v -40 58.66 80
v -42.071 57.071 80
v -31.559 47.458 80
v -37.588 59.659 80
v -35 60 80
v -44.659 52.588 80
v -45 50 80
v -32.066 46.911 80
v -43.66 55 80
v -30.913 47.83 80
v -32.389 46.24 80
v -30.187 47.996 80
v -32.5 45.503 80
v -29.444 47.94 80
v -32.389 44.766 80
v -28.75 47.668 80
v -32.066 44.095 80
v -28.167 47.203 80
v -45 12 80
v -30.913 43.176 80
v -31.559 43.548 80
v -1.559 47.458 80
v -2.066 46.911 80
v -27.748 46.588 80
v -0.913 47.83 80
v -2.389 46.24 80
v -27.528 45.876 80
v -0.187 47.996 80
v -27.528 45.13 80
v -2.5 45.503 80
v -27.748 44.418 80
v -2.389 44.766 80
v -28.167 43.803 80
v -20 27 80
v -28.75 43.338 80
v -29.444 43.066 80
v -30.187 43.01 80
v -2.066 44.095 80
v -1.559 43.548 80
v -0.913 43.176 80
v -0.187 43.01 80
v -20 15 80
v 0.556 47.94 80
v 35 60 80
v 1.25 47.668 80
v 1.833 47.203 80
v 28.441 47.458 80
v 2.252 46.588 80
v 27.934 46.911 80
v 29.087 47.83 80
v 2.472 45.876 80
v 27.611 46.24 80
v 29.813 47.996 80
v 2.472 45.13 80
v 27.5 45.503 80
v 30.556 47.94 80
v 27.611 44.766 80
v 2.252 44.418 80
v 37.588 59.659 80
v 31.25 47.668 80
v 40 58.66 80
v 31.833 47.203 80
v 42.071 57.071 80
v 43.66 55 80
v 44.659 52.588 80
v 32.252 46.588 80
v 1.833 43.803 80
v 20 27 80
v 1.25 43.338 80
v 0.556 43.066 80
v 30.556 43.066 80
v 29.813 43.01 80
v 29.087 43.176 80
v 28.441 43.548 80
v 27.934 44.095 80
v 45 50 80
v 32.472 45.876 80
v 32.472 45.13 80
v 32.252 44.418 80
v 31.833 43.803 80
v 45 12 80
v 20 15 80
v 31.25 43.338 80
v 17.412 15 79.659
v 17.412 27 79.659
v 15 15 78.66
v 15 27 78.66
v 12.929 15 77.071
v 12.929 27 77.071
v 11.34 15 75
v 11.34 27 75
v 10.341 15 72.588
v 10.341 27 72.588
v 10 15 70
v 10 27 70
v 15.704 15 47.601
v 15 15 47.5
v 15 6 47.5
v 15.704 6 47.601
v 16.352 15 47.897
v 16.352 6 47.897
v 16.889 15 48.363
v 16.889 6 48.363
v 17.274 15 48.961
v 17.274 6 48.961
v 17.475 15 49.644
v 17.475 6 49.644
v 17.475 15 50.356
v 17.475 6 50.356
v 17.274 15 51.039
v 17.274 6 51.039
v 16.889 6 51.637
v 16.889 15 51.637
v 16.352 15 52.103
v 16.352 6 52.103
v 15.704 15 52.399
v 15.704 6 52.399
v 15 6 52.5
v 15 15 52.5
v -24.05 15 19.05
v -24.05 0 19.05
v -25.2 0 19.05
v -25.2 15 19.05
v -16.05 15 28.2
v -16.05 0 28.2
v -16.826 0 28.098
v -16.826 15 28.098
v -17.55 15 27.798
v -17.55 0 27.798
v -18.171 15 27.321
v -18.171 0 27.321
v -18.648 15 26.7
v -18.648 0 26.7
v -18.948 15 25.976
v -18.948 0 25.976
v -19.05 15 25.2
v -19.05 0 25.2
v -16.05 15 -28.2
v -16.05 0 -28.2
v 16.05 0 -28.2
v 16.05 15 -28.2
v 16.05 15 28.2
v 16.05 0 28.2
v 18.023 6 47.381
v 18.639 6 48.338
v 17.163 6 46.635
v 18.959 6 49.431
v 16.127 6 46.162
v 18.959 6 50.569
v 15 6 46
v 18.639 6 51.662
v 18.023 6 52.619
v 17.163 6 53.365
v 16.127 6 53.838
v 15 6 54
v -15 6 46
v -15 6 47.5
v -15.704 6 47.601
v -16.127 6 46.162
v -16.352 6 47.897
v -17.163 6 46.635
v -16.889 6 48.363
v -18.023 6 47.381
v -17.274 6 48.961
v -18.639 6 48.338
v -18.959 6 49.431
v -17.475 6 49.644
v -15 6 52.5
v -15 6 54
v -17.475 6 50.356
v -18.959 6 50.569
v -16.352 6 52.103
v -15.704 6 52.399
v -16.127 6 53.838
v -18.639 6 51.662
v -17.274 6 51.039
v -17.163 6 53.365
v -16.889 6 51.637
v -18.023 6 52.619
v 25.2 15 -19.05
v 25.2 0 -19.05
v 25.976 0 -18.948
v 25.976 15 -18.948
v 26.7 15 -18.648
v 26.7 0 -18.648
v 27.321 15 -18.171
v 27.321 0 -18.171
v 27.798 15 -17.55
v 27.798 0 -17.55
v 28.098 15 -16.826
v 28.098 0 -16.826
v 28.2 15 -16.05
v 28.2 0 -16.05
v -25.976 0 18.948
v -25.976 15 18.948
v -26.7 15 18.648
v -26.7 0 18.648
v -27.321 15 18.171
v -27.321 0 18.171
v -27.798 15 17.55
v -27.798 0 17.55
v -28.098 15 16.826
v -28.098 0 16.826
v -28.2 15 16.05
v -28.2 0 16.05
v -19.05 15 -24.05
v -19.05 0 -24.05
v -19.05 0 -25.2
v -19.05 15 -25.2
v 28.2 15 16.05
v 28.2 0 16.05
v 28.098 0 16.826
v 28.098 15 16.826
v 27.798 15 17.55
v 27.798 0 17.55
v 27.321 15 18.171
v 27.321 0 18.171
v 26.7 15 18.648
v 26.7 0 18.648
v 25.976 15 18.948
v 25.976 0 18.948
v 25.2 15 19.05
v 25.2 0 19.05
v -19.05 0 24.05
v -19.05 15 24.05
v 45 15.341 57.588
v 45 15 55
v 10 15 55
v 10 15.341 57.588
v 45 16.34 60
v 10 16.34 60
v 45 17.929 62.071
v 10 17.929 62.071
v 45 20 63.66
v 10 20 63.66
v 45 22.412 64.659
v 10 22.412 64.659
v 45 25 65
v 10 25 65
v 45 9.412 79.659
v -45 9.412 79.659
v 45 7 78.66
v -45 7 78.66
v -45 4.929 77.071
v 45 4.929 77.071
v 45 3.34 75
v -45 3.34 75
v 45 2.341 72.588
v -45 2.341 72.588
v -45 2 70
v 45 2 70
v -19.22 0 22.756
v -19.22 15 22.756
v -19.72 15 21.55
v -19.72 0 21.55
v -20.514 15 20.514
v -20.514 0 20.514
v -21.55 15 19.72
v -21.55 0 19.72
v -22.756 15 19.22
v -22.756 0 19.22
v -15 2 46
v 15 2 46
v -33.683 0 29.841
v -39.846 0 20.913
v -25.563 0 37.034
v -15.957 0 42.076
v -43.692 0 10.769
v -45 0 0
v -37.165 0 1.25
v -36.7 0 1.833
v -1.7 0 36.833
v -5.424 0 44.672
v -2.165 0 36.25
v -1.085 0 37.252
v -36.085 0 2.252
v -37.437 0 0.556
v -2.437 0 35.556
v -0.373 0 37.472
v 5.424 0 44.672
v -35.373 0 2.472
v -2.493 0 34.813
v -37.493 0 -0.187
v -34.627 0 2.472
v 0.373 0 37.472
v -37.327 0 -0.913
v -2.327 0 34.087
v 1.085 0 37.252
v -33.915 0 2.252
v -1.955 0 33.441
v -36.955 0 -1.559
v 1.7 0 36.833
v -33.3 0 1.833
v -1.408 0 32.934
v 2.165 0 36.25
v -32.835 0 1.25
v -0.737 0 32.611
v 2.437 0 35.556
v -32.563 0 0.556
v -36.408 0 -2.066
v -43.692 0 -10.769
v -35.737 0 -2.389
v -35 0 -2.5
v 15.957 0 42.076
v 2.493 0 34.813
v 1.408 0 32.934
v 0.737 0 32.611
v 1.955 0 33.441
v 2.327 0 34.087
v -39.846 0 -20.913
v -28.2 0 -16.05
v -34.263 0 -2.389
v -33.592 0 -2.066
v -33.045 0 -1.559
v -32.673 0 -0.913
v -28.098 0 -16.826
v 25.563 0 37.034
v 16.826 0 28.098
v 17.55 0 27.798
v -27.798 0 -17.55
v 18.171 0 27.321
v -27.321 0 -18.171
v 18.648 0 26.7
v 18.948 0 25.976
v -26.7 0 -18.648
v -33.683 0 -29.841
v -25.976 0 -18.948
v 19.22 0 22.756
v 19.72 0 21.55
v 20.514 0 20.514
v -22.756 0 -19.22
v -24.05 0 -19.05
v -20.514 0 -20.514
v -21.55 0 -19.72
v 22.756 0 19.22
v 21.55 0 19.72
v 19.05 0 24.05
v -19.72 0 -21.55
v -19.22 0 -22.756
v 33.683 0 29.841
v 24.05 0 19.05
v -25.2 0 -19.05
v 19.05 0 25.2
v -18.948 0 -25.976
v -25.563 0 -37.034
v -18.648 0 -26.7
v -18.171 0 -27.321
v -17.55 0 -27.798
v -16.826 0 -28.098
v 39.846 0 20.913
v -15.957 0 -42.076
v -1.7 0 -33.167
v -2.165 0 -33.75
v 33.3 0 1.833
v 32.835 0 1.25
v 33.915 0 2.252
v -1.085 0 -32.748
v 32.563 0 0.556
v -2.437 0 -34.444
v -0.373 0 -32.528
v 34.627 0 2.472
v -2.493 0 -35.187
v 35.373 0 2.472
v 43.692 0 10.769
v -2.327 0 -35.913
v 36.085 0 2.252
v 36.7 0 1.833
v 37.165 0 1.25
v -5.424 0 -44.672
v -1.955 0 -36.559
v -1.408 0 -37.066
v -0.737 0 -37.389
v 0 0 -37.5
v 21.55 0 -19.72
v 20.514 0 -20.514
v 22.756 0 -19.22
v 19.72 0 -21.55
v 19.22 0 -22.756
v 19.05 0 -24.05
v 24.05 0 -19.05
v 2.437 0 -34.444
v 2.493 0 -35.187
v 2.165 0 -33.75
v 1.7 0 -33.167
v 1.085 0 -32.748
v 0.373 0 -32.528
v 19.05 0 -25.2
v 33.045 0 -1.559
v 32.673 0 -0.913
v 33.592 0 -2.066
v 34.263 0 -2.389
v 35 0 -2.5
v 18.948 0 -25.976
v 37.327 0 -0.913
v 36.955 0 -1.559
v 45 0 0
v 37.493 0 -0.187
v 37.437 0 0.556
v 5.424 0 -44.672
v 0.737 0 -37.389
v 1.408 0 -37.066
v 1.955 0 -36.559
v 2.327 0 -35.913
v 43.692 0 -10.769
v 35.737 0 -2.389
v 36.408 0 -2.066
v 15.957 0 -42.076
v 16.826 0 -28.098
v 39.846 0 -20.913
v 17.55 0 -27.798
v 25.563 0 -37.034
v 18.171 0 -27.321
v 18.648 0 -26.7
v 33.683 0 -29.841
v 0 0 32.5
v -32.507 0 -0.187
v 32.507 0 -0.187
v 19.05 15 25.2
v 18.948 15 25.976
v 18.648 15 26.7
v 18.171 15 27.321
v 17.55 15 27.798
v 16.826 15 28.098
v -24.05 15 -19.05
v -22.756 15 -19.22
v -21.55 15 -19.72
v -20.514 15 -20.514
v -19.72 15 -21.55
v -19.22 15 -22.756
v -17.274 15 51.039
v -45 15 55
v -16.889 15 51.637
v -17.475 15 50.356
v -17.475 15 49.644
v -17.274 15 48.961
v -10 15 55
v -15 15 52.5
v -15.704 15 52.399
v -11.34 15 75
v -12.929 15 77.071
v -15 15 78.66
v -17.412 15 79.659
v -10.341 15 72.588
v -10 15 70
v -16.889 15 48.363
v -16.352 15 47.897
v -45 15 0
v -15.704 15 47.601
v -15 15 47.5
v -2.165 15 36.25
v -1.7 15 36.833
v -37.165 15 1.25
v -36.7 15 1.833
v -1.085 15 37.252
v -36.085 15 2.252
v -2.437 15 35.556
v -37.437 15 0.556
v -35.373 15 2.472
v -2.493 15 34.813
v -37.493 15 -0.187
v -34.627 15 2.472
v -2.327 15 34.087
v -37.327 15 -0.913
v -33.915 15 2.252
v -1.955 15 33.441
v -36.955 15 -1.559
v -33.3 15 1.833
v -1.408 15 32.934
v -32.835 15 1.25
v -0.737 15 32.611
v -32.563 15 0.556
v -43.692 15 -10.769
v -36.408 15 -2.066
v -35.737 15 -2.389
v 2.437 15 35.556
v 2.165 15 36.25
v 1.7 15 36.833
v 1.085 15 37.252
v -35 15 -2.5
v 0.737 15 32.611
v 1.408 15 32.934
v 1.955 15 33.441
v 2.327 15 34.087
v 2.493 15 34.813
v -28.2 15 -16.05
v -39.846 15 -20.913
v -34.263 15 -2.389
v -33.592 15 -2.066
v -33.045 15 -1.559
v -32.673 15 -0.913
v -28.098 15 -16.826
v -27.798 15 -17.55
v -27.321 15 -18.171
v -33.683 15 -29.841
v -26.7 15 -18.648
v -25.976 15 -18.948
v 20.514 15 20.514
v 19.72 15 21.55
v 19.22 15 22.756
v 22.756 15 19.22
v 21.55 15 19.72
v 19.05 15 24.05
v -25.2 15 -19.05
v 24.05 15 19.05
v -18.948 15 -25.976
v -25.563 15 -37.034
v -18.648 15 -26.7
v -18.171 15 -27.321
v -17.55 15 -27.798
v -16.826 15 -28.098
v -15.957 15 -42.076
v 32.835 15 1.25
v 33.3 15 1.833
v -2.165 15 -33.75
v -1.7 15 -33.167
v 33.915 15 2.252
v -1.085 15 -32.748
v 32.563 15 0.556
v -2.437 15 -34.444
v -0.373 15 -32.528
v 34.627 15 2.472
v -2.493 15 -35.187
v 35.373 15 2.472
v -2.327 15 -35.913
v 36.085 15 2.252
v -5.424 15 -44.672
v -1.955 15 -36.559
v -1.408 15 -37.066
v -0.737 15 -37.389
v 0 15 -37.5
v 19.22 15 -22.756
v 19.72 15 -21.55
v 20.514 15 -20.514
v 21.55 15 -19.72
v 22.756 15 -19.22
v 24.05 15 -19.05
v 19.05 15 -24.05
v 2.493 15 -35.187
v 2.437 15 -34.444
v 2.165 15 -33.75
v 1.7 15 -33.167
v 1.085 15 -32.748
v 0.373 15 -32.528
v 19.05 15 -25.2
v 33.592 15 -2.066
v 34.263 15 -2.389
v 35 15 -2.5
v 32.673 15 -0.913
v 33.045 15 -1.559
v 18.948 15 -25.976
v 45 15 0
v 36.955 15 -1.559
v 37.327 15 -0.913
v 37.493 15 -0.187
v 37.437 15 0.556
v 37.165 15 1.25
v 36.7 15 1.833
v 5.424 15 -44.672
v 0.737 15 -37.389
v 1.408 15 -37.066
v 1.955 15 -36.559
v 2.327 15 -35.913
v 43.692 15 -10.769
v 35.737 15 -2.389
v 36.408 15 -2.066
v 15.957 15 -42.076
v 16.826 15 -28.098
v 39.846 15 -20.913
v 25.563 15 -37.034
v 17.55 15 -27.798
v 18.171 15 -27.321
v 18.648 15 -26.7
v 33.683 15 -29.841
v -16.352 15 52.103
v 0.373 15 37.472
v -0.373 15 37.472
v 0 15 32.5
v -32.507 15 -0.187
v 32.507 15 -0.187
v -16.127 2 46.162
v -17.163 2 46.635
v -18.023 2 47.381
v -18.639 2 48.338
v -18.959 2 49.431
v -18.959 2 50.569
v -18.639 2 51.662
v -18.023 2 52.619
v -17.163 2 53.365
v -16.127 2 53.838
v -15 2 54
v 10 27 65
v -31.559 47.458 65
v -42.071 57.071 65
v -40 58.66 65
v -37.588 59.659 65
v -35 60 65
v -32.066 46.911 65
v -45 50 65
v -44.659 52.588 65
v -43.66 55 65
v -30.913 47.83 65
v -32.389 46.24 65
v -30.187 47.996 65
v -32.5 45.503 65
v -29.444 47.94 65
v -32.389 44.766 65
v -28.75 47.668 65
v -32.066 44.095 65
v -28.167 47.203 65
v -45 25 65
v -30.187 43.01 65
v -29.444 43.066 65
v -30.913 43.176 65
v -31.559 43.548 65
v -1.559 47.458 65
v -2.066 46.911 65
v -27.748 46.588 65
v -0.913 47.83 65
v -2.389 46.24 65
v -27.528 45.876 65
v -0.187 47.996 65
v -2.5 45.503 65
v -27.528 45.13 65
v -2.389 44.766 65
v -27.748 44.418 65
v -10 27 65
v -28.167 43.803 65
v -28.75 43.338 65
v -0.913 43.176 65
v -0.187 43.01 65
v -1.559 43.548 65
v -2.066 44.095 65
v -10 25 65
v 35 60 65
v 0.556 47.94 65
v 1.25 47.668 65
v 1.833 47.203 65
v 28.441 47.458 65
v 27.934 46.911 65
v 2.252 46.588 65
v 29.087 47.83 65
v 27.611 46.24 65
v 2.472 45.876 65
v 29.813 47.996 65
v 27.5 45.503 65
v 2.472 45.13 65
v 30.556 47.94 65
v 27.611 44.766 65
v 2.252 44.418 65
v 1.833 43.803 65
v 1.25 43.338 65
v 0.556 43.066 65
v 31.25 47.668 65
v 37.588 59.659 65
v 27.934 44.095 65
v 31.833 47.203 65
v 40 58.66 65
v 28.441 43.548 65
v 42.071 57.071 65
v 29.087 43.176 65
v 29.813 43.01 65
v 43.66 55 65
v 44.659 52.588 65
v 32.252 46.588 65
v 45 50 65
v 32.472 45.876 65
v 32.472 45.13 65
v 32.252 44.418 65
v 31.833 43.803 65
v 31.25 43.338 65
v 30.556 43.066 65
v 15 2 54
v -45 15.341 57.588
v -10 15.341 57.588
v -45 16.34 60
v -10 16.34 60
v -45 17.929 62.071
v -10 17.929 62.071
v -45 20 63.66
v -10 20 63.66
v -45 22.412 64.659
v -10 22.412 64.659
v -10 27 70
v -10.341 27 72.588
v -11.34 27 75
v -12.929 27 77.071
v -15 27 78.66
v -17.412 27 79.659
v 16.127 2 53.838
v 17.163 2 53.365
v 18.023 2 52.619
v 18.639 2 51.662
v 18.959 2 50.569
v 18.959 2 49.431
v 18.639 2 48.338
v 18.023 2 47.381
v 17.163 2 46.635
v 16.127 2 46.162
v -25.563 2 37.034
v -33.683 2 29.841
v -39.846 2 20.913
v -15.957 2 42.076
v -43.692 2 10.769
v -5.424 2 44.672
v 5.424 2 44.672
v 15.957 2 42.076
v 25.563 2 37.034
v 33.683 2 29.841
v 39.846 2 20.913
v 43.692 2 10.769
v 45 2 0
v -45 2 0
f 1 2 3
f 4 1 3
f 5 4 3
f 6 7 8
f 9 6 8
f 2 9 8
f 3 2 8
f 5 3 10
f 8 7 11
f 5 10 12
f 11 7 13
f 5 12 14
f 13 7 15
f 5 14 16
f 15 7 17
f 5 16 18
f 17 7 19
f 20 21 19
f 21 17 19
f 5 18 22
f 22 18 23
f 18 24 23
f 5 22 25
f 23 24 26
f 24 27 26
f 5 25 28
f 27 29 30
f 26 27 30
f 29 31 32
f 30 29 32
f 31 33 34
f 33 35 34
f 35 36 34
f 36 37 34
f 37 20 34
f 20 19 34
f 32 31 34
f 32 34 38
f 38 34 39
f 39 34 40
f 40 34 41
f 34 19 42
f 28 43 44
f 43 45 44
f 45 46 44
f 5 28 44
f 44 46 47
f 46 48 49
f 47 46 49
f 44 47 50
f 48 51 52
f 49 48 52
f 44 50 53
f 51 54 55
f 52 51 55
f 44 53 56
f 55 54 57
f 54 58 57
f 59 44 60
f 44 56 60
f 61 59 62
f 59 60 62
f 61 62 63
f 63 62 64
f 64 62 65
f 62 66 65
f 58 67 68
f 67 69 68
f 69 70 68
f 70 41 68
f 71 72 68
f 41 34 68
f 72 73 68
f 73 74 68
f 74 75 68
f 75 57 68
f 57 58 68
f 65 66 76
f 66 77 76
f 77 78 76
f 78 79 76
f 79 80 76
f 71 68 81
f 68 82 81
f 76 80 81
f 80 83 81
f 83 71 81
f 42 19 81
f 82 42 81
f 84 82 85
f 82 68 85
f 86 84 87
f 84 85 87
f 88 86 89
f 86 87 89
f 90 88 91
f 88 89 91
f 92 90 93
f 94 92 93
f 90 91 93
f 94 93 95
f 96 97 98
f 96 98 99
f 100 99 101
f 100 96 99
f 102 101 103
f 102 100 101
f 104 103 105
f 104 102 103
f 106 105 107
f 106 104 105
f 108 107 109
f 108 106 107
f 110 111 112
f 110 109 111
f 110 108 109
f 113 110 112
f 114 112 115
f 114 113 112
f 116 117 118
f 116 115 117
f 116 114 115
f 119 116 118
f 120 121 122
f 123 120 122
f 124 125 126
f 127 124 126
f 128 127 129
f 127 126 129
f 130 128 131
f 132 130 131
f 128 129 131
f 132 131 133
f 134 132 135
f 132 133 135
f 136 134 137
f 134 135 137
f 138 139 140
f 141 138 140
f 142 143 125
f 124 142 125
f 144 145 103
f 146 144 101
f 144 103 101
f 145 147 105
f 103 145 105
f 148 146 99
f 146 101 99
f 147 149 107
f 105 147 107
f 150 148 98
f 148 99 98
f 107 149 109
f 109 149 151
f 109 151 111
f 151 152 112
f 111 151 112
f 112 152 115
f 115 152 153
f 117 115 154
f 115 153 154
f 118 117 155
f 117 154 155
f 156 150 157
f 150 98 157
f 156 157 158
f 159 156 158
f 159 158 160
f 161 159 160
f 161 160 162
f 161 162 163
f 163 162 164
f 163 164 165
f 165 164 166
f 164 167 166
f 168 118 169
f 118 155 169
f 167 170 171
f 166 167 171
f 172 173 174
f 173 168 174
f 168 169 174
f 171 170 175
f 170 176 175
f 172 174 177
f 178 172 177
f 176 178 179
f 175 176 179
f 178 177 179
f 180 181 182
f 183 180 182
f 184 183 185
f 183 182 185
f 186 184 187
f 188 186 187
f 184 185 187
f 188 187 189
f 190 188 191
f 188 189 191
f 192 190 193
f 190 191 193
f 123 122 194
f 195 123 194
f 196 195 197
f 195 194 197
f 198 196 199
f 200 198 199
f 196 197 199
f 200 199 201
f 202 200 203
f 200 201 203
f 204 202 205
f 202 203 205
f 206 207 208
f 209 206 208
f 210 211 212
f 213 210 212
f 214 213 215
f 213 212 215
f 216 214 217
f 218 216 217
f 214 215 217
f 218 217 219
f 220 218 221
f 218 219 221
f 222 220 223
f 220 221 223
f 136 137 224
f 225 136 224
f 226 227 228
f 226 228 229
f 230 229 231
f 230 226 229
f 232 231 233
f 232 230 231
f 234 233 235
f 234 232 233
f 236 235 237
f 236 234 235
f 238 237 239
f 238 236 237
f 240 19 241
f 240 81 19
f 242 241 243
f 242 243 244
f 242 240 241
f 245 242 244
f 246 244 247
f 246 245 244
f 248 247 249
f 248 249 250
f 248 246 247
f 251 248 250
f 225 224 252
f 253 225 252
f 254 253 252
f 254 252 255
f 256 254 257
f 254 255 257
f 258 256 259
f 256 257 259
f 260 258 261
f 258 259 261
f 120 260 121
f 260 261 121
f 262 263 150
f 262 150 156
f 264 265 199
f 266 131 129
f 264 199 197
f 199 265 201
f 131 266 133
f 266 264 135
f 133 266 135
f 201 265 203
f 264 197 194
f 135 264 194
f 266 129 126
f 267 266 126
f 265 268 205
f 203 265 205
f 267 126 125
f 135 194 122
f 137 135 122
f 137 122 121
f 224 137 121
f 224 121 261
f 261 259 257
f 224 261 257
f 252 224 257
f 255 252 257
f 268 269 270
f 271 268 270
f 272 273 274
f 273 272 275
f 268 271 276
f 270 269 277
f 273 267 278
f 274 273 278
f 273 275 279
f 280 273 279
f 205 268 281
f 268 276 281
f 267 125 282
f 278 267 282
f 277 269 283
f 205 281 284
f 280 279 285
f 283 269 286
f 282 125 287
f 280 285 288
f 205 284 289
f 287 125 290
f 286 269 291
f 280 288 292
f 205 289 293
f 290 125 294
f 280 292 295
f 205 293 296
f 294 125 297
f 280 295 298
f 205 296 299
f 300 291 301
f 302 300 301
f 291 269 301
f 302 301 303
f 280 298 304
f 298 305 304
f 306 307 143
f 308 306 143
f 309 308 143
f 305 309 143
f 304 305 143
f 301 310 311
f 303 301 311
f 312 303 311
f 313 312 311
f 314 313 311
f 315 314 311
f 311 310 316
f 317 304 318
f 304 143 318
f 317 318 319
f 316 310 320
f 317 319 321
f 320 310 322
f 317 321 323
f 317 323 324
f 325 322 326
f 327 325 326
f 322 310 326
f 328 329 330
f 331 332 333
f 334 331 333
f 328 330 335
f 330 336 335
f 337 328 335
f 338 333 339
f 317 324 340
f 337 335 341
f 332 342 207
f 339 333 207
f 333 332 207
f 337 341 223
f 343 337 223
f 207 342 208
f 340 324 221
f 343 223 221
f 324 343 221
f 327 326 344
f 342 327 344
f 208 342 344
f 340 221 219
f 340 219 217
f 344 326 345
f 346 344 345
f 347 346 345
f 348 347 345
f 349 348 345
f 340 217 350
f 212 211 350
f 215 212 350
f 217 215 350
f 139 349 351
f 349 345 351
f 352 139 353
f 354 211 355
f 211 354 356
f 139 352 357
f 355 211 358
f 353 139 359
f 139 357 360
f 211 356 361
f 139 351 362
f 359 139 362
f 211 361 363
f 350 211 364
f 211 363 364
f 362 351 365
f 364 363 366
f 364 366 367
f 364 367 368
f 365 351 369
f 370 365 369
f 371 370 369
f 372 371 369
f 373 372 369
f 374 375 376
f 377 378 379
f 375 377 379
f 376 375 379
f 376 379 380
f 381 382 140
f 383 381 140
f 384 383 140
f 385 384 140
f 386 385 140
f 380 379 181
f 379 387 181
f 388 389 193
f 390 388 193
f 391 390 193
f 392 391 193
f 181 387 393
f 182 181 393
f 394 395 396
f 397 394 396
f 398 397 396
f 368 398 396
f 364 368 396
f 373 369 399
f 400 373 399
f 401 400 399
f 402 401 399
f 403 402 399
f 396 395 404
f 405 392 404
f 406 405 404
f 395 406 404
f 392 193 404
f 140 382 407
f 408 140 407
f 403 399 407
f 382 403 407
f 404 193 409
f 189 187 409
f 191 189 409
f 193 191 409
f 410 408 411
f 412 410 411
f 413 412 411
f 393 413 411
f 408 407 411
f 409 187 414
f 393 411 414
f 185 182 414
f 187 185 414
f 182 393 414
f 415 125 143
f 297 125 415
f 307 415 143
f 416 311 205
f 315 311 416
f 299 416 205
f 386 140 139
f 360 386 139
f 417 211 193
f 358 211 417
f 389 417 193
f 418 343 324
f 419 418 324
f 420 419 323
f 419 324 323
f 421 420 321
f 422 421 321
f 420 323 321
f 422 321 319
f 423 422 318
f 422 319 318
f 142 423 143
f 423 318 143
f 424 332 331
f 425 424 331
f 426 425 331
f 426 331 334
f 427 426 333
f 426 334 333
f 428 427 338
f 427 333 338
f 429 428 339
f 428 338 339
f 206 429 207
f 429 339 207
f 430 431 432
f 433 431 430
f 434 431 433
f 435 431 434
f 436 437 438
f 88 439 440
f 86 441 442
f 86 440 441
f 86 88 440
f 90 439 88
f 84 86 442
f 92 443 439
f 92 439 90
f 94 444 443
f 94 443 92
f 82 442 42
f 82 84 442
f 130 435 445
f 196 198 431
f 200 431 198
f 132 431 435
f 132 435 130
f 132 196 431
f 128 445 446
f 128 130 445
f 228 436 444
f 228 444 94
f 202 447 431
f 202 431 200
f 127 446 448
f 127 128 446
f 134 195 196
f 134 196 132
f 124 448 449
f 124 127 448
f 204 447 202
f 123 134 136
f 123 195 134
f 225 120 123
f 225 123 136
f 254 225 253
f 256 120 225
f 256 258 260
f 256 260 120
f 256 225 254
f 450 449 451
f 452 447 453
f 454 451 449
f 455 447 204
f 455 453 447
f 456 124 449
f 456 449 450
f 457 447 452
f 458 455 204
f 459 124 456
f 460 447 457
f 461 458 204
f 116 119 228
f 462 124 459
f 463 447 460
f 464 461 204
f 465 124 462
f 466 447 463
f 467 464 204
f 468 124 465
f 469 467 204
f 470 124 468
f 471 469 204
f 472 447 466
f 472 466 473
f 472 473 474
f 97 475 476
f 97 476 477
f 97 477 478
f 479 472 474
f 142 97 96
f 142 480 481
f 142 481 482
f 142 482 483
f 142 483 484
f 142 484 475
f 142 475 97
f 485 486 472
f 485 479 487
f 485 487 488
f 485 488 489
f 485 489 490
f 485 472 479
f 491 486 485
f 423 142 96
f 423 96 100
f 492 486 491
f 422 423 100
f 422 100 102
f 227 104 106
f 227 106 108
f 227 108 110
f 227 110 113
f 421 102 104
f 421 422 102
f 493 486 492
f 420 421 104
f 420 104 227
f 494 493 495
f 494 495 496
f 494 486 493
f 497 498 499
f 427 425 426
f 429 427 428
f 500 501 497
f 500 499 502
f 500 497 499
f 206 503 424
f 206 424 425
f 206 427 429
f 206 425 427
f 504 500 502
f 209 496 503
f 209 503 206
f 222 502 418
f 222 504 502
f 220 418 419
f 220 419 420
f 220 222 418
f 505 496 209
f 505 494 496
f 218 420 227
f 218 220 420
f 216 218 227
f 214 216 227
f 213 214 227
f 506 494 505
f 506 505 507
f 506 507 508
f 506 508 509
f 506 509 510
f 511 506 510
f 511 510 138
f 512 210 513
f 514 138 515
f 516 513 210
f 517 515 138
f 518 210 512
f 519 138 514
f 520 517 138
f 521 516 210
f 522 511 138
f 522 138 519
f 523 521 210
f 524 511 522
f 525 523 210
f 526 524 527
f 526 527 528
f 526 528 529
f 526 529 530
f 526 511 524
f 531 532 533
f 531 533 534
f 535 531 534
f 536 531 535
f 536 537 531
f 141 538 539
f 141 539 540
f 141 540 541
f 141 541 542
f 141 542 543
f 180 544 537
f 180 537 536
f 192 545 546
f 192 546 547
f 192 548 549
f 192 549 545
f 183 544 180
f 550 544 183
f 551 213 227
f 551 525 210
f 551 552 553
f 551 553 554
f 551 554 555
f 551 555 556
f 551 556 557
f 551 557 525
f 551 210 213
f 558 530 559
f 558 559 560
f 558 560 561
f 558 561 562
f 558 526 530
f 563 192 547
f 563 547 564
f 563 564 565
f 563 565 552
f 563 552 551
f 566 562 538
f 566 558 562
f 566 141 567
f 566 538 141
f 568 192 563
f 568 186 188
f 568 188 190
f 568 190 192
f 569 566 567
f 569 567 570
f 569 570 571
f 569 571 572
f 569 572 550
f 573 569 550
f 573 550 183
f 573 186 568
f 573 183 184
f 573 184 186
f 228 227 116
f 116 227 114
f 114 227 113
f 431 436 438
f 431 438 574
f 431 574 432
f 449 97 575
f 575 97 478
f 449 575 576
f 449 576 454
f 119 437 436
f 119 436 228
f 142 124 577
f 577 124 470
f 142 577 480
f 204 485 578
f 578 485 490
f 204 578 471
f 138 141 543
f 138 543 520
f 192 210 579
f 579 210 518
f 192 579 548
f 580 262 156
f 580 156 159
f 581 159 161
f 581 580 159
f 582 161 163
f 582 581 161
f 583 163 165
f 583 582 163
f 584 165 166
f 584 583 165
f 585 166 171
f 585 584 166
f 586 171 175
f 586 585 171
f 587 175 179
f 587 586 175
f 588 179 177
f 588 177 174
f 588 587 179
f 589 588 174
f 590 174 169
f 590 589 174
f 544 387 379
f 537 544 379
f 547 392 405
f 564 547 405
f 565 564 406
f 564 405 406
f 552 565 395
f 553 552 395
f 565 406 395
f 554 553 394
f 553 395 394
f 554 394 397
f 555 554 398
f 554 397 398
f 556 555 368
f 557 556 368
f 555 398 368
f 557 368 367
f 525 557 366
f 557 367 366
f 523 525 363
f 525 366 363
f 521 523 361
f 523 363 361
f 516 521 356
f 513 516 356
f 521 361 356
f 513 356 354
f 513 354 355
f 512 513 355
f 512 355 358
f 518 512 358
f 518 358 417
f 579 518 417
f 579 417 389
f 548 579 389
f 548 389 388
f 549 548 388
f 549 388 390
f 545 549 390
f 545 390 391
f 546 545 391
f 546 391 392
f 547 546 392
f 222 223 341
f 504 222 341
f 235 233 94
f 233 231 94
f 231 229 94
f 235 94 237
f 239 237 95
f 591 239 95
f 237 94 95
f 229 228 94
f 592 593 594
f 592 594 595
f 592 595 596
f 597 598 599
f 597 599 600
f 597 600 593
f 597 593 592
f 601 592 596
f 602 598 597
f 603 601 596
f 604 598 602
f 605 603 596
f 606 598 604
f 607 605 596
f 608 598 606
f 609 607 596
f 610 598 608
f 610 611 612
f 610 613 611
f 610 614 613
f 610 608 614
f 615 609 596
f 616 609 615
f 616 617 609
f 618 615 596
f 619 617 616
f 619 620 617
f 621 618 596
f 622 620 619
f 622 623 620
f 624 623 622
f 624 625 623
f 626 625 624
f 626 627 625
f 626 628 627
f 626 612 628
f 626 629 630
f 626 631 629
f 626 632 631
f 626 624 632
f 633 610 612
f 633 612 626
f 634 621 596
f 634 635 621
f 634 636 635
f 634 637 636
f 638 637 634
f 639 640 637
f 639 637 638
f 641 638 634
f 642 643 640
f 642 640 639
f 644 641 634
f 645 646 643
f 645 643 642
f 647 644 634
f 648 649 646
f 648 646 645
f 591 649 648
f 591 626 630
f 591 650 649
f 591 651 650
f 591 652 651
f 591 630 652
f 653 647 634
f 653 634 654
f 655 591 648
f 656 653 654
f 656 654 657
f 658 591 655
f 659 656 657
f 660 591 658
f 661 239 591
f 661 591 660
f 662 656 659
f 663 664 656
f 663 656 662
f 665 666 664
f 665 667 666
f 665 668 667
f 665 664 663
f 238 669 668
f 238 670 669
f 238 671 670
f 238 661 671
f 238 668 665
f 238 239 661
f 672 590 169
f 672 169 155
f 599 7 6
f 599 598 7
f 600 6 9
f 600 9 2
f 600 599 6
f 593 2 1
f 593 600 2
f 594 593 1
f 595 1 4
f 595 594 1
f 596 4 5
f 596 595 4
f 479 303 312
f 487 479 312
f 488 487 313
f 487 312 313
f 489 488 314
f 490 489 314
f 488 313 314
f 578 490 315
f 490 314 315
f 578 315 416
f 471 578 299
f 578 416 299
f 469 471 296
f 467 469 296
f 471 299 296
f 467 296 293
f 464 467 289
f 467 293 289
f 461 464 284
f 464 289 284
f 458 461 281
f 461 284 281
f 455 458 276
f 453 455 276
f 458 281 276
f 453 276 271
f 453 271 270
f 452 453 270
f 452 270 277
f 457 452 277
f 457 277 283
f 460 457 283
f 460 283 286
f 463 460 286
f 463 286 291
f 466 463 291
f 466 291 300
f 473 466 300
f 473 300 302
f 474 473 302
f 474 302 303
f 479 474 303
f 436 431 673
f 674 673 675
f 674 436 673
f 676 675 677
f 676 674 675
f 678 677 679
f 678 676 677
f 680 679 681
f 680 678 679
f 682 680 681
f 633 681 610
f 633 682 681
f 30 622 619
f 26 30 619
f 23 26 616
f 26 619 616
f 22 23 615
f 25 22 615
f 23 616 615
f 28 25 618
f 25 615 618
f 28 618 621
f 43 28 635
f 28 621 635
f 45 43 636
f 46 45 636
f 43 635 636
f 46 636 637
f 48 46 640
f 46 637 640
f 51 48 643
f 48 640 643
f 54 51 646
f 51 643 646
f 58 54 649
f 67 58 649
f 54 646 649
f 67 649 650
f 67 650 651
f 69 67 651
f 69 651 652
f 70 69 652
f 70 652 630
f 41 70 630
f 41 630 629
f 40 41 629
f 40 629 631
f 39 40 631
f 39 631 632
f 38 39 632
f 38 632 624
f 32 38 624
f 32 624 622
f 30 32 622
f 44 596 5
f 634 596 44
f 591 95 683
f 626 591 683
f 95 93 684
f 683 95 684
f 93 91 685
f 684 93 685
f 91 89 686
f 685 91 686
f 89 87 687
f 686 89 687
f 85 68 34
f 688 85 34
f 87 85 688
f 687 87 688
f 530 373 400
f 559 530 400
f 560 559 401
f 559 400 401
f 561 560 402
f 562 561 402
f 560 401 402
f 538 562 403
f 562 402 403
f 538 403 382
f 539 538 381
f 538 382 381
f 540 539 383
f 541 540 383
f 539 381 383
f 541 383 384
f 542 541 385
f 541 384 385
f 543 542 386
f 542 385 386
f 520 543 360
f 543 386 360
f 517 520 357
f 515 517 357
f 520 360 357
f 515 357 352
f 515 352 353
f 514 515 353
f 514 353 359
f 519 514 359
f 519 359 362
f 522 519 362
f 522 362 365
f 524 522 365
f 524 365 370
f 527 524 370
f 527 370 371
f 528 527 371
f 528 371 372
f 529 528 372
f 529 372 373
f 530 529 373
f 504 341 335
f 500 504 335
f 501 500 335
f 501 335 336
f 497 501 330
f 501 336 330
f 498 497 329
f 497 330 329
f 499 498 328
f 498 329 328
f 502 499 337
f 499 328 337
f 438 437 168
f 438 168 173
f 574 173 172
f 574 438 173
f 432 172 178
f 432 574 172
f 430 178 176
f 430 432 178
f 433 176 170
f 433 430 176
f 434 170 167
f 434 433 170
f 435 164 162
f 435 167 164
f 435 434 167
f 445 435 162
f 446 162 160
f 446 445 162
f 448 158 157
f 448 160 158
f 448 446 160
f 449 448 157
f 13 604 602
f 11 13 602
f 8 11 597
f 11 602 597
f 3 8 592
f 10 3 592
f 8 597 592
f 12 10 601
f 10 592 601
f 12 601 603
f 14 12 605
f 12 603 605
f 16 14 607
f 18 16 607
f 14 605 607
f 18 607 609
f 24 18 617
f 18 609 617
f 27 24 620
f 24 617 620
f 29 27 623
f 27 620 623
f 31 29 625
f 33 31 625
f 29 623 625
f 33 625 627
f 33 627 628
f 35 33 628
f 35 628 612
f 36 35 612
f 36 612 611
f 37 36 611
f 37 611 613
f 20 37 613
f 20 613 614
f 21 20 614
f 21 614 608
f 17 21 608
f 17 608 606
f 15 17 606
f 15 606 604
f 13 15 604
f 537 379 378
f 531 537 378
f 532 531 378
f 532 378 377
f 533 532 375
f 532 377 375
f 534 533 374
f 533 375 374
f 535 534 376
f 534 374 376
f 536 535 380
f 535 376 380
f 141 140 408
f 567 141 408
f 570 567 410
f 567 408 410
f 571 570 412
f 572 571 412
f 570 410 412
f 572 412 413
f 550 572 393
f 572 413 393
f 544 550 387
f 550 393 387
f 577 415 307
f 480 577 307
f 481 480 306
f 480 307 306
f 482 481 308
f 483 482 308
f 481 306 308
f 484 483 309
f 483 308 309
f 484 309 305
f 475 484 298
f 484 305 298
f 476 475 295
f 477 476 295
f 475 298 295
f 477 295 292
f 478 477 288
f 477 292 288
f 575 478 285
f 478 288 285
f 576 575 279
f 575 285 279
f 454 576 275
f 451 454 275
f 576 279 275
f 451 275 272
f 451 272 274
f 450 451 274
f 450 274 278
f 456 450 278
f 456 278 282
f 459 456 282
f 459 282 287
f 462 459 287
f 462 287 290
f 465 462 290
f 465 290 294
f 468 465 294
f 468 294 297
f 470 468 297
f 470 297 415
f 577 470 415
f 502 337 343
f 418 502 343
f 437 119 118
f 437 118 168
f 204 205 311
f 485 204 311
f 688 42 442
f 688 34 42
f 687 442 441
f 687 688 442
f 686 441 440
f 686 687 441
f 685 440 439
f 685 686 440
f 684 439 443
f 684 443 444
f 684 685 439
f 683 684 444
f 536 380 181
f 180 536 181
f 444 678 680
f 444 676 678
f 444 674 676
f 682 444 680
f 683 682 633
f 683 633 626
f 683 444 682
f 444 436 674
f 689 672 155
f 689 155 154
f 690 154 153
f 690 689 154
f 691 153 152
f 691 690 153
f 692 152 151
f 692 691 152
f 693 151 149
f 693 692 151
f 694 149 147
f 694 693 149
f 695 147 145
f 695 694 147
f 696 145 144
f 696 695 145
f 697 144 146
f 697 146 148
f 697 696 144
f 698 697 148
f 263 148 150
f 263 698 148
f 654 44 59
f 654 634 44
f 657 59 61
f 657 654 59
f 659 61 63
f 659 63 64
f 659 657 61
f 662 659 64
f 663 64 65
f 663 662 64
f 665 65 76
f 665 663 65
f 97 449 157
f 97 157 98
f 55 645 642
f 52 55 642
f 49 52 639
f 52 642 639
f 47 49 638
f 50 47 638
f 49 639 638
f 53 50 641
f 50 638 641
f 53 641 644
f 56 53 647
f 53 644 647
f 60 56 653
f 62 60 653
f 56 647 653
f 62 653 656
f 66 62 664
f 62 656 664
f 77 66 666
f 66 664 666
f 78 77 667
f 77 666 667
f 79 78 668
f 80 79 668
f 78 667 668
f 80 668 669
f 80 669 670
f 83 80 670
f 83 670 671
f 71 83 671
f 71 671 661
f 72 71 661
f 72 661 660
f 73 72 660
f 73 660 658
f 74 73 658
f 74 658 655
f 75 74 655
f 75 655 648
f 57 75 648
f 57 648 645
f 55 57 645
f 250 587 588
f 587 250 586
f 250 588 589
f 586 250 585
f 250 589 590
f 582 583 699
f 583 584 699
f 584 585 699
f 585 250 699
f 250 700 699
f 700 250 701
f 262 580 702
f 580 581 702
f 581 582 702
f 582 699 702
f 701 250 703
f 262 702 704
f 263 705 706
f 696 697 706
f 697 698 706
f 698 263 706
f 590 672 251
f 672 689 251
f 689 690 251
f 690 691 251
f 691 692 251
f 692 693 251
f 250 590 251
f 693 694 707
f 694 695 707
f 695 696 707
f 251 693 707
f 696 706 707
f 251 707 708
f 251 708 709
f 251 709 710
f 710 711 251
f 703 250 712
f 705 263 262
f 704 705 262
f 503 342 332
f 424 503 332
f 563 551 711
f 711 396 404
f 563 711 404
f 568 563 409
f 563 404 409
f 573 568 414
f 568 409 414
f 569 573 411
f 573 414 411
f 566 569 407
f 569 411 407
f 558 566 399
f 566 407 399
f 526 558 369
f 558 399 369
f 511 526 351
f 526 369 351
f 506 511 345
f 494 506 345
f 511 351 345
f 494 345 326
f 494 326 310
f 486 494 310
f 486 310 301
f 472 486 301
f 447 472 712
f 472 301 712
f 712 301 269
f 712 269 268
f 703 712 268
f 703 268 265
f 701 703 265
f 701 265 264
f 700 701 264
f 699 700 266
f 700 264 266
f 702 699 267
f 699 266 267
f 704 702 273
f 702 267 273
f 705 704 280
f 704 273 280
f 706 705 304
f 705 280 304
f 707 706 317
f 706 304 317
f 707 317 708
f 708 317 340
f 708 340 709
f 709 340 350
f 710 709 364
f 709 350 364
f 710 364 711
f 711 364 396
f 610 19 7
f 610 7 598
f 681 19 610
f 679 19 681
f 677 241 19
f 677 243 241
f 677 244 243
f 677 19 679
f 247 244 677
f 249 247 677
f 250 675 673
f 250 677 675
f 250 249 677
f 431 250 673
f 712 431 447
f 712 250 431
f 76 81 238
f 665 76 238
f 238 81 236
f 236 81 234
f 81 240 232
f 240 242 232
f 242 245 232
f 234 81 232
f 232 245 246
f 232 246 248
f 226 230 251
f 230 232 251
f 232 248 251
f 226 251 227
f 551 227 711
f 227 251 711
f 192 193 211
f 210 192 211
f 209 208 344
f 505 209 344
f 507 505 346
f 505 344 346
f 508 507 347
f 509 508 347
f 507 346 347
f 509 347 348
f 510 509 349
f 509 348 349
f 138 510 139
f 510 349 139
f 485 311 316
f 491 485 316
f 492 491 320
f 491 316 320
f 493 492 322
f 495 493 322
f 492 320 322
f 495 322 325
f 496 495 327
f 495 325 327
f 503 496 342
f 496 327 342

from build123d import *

# Parameters (mm, degrees)
BOSS_EXTRUDE1_DEPTH     = 15
SKETCH2_W               = 90
SKETCH2_H               = 15
BOSS_EXTRUDE2_DEPTH     = 45
CUT_EXTRUDE1_DEPTH      = 2
SKETCH4_R               = 2.5
CUT_EXTRUDE2_DEPTH      = 110.658560997
FILLET1_R               = 10
SKETCH5_R               = 2.5
CUT_EXTRUDE3_DEPTH      = 134.135269557
CUT_EXTRUDE4_DEPTH      = 103.225241501
CUT_EXTRUDE5_DEPTH      = 4
CUT_EXTRUDE6_DEPTH      = 10
CUT_EXTRUDE6_DEPTH_BACK = 15
SKETCH8_W               = 20
SKETCH8_H               = 12
FILLET2_R               = 10


with BuildPart() as part:
    # Sketch1 → Boss-Extrude1 (new body)
    with BuildSketch(Plane(origin=(0, 0, 0), x_dir=(1, 0, 0), z_dir=(0, 1, 0))):
        with BuildLine():
            ThreePointArc((45, 0), (0, -45), (-45, 0))
            Line((-45, 0), (-45, -80))
            Line((-45, -80), (45, -80))
            Line((45, -80), (45, 0))
        make_face()
        with BuildLine():
            Line((-28.2, -16.05), (-28.2, 0))
            Line((-28.2, 0), (-45, 0))
            ThreePointArc((-45, 0), (0, -45), (45, 0))
            Line((45, 0), (28.2, 0))
            Line((28.2, 0), (28.2, -16.05))
            ThreePointArc((28.2, -16.05), (27.321320344, -18.171320344), (25.2, -19.05))
            Line((25.2, -19.05), (24.05, -19.05))
            ThreePointArc((24.05, -19.05), (20.514466094, -20.514466094), (19.05, -24.05))
            Line((19.05, -24.05), (19.05, -25.2))
            ThreePointArc((19.05, -25.2), (18.171320344, -27.321320344), (16.05, -28.2))
            Line((16.05, -28.2), (-16.05, -28.2))
            ThreePointArc((-16.05, -28.2), (-18.171320344, -27.321320344), (-19.05, -25.2))
            Line((-19.05, -25.2), (-19.05, -24.05))
            ThreePointArc((-19.05, -24.05), (-20.514466094, -20.514466094), (-24.05, -19.05))
            Line((-24.05, -19.05), (-25.2, -19.05))
            ThreePointArc((-25.2, -19.05), (-27.321320344, -18.171320344), (-28.2, -16.05))
        make_face()
        with BuildLine():
            ThreePointArc((-19.05, 25.2), (-18.171320344, 27.321320344), (-16.05, 28.2))
            Line((-16.05, 28.2), (16.05, 28.2))
            ThreePointArc((16.05, 28.2), (18.171320344, 27.321320344), (19.05, 25.2))
            Line((19.05, 25.2), (19.05, 24.05))
            ThreePointArc((19.05, 24.05), (20.514466094, 20.514466094), (24.05, 19.05))
            Line((24.05, 19.05), (25.2, 19.05))
            ThreePointArc((25.2, 19.05), (27.321320344, 18.171320344), (28.2, 16.05))
            Line((28.2, 16.05), (28.2, 0))
            Line((28.2, 0), (45, 0))
            ThreePointArc((45, 0), (0, 45), (-45, 0))
            Line((-45, 0), (-28.2, 0))
            Line((-28.2, 0), (-28.2, 16.05))
            ThreePointArc((-28.2, 16.05), (-27.321320344, 18.171320344), (-25.2, 19.05))
            Line((-25.2, 19.05), (-24.05, 19.05))
            ThreePointArc((-24.05, 19.05), (-20.514466094, 20.514466094), (-19.05, 24.05))
            Line((-19.05, 24.05), (-19.05, 25.2))
        make_face()
    extrude(amount=BOSS_EXTRUDE1_DEPTH)

    # Sketch2 → Boss-Extrude2 (add)
    with BuildSketch(Plane(origin=(0, 15, 0), x_dir=(1, 0, 0), z_dir=(0, 1, 0))):
        with Locations((0, -72.5)):
            Rectangle(SKETCH2_W, SKETCH2_H)
    extrude(amount=BOSS_EXTRUDE2_DEPTH)

    # Sketch3 → Cut-Extrude1 (cut)
    with BuildSketch(Plane(origin=(0, 0, 0), x_dir=(-1, 0, 0), z_dir=(0, -1, 0))):
        with BuildLine():
            Line((45, -80), (-45, -80))
            Line((-45, -80), (-45, 0))
            ThreePointArc((-45, 0), (0, -45), (45, 0))
            Line((45, 0), (45, -80))
        make_face()
    extrude(amount=-CUT_EXTRUDE1_DEPTH, mode=Mode.SUBTRACT)

    # Sketch4 → Cut-Extrude2 (cut, through all)
    with BuildSketch(Plane(origin=(0, 0, 0), x_dir=(-1, 0, 0), z_dir=(0, -1, 0))):
        with Locations(Location((0, -35, 0), (0, 0, 90))):
            Circle(SKETCH4_R)
        with Locations(Location((-35, 0, 0), (0, 0, 90))):
            Circle(SKETCH4_R)
        with Locations(Location((0, 35, 0), (0, 0, 90))):
            Circle(SKETCH4_R)
        with Locations(Location((35, 0, 0), (0, 0, 90))):
            Circle(SKETCH4_R)
    extrude(amount=-CUT_EXTRUDE2_DEPTH, mode=Mode.SUBTRACT)

    # Fillet1
    fillet1_edges = [part.edges().sort_by_distance(p)[0] for p in [
        (0, 2, 80),
        (-45, 60, 72.5),
        (45, 60, 72.5),
        (0, 15, 65),
    ]]
    fillet(fillet1_edges, radius=FILLET1_R)

    # Sketch5 → Cut-Extrude3 (cut, through all)
    with BuildSketch(Plane(origin=(0, 0, 65), x_dir=(-1, 0, 0), z_dir=(0, 0, -1))):
        with Locations((-30, 45.502937017)):
            Circle(SKETCH5_R)
        with Locations((30, 45.502937017)):
            Circle(SKETCH5_R)
        with Locations((0, 45.502937017)):
            Circle(SKETCH5_R)
    extrude(amount=-CUT_EXTRUDE3_DEPTH, mode=Mode.SUBTRACT)

    # Sketch6 → Cut-Extrude4 (cut, through all)
    with BuildSketch(Plane(origin=(0, 15, 0), x_dir=(1, 0, 0), z_dir=(0, 1, 0))):
        with BuildLine():
            Line((-15, -47.5), (15, -47.5))
            ThreePointArc((15, -47.5), (17.5, -50), (15, -52.5))
            Line((15, -52.5), (-15, -52.5))
            ThreePointArc((-15, -52.5), (-17.5, -50), (-15, -47.5))
        make_face()
    extrude(amount=-CUT_EXTRUDE4_DEPTH, mode=Mode.SUBTRACT)

    # Sketch7 → Cut-Extrude5 (cut)
    with BuildSketch(Plane.XZ.offset(-2)):
        with BuildLine():
            Line((-15, 54), (15, 54))
            ThreePointArc((15, 54), (19, 50), (15, 46))
            Line((15, 46), (-15, 46))
            ThreePointArc((-15, 46), (-19, 50), (-15, 54))
        make_face()
    extrude(amount=-CUT_EXTRUDE5_DEPTH, mode=Mode.SUBTRACT)

    # Sketch8 → Cut-Extrude6 (cut, two sides: drawn at the far end of the back side and taken through both)
    with BuildSketch(Plane(origin=(0, 0, 65), x_dir=(-1, 0, 0), z_dir=(0, 0, -1)).offset(-CUT_EXTRUDE6_DEPTH_BACK)):
        with Locations((0, 21)):
            Rectangle(SKETCH8_W, SKETCH8_H)
    extrude(amount=CUT_EXTRUDE6_DEPTH + CUT_EXTRUDE6_DEPTH_BACK, mode=Mode.SUBTRACT)

    # Fillet2
    fillet2_edges = [part.edges().sort_by_distance(p)[0] for p in [
        (10, 21, 80),
        (-10, 21, 80),
    ]]
    fillet(fillet2_edges, radius=FILLET2_R)


solid = part.part
